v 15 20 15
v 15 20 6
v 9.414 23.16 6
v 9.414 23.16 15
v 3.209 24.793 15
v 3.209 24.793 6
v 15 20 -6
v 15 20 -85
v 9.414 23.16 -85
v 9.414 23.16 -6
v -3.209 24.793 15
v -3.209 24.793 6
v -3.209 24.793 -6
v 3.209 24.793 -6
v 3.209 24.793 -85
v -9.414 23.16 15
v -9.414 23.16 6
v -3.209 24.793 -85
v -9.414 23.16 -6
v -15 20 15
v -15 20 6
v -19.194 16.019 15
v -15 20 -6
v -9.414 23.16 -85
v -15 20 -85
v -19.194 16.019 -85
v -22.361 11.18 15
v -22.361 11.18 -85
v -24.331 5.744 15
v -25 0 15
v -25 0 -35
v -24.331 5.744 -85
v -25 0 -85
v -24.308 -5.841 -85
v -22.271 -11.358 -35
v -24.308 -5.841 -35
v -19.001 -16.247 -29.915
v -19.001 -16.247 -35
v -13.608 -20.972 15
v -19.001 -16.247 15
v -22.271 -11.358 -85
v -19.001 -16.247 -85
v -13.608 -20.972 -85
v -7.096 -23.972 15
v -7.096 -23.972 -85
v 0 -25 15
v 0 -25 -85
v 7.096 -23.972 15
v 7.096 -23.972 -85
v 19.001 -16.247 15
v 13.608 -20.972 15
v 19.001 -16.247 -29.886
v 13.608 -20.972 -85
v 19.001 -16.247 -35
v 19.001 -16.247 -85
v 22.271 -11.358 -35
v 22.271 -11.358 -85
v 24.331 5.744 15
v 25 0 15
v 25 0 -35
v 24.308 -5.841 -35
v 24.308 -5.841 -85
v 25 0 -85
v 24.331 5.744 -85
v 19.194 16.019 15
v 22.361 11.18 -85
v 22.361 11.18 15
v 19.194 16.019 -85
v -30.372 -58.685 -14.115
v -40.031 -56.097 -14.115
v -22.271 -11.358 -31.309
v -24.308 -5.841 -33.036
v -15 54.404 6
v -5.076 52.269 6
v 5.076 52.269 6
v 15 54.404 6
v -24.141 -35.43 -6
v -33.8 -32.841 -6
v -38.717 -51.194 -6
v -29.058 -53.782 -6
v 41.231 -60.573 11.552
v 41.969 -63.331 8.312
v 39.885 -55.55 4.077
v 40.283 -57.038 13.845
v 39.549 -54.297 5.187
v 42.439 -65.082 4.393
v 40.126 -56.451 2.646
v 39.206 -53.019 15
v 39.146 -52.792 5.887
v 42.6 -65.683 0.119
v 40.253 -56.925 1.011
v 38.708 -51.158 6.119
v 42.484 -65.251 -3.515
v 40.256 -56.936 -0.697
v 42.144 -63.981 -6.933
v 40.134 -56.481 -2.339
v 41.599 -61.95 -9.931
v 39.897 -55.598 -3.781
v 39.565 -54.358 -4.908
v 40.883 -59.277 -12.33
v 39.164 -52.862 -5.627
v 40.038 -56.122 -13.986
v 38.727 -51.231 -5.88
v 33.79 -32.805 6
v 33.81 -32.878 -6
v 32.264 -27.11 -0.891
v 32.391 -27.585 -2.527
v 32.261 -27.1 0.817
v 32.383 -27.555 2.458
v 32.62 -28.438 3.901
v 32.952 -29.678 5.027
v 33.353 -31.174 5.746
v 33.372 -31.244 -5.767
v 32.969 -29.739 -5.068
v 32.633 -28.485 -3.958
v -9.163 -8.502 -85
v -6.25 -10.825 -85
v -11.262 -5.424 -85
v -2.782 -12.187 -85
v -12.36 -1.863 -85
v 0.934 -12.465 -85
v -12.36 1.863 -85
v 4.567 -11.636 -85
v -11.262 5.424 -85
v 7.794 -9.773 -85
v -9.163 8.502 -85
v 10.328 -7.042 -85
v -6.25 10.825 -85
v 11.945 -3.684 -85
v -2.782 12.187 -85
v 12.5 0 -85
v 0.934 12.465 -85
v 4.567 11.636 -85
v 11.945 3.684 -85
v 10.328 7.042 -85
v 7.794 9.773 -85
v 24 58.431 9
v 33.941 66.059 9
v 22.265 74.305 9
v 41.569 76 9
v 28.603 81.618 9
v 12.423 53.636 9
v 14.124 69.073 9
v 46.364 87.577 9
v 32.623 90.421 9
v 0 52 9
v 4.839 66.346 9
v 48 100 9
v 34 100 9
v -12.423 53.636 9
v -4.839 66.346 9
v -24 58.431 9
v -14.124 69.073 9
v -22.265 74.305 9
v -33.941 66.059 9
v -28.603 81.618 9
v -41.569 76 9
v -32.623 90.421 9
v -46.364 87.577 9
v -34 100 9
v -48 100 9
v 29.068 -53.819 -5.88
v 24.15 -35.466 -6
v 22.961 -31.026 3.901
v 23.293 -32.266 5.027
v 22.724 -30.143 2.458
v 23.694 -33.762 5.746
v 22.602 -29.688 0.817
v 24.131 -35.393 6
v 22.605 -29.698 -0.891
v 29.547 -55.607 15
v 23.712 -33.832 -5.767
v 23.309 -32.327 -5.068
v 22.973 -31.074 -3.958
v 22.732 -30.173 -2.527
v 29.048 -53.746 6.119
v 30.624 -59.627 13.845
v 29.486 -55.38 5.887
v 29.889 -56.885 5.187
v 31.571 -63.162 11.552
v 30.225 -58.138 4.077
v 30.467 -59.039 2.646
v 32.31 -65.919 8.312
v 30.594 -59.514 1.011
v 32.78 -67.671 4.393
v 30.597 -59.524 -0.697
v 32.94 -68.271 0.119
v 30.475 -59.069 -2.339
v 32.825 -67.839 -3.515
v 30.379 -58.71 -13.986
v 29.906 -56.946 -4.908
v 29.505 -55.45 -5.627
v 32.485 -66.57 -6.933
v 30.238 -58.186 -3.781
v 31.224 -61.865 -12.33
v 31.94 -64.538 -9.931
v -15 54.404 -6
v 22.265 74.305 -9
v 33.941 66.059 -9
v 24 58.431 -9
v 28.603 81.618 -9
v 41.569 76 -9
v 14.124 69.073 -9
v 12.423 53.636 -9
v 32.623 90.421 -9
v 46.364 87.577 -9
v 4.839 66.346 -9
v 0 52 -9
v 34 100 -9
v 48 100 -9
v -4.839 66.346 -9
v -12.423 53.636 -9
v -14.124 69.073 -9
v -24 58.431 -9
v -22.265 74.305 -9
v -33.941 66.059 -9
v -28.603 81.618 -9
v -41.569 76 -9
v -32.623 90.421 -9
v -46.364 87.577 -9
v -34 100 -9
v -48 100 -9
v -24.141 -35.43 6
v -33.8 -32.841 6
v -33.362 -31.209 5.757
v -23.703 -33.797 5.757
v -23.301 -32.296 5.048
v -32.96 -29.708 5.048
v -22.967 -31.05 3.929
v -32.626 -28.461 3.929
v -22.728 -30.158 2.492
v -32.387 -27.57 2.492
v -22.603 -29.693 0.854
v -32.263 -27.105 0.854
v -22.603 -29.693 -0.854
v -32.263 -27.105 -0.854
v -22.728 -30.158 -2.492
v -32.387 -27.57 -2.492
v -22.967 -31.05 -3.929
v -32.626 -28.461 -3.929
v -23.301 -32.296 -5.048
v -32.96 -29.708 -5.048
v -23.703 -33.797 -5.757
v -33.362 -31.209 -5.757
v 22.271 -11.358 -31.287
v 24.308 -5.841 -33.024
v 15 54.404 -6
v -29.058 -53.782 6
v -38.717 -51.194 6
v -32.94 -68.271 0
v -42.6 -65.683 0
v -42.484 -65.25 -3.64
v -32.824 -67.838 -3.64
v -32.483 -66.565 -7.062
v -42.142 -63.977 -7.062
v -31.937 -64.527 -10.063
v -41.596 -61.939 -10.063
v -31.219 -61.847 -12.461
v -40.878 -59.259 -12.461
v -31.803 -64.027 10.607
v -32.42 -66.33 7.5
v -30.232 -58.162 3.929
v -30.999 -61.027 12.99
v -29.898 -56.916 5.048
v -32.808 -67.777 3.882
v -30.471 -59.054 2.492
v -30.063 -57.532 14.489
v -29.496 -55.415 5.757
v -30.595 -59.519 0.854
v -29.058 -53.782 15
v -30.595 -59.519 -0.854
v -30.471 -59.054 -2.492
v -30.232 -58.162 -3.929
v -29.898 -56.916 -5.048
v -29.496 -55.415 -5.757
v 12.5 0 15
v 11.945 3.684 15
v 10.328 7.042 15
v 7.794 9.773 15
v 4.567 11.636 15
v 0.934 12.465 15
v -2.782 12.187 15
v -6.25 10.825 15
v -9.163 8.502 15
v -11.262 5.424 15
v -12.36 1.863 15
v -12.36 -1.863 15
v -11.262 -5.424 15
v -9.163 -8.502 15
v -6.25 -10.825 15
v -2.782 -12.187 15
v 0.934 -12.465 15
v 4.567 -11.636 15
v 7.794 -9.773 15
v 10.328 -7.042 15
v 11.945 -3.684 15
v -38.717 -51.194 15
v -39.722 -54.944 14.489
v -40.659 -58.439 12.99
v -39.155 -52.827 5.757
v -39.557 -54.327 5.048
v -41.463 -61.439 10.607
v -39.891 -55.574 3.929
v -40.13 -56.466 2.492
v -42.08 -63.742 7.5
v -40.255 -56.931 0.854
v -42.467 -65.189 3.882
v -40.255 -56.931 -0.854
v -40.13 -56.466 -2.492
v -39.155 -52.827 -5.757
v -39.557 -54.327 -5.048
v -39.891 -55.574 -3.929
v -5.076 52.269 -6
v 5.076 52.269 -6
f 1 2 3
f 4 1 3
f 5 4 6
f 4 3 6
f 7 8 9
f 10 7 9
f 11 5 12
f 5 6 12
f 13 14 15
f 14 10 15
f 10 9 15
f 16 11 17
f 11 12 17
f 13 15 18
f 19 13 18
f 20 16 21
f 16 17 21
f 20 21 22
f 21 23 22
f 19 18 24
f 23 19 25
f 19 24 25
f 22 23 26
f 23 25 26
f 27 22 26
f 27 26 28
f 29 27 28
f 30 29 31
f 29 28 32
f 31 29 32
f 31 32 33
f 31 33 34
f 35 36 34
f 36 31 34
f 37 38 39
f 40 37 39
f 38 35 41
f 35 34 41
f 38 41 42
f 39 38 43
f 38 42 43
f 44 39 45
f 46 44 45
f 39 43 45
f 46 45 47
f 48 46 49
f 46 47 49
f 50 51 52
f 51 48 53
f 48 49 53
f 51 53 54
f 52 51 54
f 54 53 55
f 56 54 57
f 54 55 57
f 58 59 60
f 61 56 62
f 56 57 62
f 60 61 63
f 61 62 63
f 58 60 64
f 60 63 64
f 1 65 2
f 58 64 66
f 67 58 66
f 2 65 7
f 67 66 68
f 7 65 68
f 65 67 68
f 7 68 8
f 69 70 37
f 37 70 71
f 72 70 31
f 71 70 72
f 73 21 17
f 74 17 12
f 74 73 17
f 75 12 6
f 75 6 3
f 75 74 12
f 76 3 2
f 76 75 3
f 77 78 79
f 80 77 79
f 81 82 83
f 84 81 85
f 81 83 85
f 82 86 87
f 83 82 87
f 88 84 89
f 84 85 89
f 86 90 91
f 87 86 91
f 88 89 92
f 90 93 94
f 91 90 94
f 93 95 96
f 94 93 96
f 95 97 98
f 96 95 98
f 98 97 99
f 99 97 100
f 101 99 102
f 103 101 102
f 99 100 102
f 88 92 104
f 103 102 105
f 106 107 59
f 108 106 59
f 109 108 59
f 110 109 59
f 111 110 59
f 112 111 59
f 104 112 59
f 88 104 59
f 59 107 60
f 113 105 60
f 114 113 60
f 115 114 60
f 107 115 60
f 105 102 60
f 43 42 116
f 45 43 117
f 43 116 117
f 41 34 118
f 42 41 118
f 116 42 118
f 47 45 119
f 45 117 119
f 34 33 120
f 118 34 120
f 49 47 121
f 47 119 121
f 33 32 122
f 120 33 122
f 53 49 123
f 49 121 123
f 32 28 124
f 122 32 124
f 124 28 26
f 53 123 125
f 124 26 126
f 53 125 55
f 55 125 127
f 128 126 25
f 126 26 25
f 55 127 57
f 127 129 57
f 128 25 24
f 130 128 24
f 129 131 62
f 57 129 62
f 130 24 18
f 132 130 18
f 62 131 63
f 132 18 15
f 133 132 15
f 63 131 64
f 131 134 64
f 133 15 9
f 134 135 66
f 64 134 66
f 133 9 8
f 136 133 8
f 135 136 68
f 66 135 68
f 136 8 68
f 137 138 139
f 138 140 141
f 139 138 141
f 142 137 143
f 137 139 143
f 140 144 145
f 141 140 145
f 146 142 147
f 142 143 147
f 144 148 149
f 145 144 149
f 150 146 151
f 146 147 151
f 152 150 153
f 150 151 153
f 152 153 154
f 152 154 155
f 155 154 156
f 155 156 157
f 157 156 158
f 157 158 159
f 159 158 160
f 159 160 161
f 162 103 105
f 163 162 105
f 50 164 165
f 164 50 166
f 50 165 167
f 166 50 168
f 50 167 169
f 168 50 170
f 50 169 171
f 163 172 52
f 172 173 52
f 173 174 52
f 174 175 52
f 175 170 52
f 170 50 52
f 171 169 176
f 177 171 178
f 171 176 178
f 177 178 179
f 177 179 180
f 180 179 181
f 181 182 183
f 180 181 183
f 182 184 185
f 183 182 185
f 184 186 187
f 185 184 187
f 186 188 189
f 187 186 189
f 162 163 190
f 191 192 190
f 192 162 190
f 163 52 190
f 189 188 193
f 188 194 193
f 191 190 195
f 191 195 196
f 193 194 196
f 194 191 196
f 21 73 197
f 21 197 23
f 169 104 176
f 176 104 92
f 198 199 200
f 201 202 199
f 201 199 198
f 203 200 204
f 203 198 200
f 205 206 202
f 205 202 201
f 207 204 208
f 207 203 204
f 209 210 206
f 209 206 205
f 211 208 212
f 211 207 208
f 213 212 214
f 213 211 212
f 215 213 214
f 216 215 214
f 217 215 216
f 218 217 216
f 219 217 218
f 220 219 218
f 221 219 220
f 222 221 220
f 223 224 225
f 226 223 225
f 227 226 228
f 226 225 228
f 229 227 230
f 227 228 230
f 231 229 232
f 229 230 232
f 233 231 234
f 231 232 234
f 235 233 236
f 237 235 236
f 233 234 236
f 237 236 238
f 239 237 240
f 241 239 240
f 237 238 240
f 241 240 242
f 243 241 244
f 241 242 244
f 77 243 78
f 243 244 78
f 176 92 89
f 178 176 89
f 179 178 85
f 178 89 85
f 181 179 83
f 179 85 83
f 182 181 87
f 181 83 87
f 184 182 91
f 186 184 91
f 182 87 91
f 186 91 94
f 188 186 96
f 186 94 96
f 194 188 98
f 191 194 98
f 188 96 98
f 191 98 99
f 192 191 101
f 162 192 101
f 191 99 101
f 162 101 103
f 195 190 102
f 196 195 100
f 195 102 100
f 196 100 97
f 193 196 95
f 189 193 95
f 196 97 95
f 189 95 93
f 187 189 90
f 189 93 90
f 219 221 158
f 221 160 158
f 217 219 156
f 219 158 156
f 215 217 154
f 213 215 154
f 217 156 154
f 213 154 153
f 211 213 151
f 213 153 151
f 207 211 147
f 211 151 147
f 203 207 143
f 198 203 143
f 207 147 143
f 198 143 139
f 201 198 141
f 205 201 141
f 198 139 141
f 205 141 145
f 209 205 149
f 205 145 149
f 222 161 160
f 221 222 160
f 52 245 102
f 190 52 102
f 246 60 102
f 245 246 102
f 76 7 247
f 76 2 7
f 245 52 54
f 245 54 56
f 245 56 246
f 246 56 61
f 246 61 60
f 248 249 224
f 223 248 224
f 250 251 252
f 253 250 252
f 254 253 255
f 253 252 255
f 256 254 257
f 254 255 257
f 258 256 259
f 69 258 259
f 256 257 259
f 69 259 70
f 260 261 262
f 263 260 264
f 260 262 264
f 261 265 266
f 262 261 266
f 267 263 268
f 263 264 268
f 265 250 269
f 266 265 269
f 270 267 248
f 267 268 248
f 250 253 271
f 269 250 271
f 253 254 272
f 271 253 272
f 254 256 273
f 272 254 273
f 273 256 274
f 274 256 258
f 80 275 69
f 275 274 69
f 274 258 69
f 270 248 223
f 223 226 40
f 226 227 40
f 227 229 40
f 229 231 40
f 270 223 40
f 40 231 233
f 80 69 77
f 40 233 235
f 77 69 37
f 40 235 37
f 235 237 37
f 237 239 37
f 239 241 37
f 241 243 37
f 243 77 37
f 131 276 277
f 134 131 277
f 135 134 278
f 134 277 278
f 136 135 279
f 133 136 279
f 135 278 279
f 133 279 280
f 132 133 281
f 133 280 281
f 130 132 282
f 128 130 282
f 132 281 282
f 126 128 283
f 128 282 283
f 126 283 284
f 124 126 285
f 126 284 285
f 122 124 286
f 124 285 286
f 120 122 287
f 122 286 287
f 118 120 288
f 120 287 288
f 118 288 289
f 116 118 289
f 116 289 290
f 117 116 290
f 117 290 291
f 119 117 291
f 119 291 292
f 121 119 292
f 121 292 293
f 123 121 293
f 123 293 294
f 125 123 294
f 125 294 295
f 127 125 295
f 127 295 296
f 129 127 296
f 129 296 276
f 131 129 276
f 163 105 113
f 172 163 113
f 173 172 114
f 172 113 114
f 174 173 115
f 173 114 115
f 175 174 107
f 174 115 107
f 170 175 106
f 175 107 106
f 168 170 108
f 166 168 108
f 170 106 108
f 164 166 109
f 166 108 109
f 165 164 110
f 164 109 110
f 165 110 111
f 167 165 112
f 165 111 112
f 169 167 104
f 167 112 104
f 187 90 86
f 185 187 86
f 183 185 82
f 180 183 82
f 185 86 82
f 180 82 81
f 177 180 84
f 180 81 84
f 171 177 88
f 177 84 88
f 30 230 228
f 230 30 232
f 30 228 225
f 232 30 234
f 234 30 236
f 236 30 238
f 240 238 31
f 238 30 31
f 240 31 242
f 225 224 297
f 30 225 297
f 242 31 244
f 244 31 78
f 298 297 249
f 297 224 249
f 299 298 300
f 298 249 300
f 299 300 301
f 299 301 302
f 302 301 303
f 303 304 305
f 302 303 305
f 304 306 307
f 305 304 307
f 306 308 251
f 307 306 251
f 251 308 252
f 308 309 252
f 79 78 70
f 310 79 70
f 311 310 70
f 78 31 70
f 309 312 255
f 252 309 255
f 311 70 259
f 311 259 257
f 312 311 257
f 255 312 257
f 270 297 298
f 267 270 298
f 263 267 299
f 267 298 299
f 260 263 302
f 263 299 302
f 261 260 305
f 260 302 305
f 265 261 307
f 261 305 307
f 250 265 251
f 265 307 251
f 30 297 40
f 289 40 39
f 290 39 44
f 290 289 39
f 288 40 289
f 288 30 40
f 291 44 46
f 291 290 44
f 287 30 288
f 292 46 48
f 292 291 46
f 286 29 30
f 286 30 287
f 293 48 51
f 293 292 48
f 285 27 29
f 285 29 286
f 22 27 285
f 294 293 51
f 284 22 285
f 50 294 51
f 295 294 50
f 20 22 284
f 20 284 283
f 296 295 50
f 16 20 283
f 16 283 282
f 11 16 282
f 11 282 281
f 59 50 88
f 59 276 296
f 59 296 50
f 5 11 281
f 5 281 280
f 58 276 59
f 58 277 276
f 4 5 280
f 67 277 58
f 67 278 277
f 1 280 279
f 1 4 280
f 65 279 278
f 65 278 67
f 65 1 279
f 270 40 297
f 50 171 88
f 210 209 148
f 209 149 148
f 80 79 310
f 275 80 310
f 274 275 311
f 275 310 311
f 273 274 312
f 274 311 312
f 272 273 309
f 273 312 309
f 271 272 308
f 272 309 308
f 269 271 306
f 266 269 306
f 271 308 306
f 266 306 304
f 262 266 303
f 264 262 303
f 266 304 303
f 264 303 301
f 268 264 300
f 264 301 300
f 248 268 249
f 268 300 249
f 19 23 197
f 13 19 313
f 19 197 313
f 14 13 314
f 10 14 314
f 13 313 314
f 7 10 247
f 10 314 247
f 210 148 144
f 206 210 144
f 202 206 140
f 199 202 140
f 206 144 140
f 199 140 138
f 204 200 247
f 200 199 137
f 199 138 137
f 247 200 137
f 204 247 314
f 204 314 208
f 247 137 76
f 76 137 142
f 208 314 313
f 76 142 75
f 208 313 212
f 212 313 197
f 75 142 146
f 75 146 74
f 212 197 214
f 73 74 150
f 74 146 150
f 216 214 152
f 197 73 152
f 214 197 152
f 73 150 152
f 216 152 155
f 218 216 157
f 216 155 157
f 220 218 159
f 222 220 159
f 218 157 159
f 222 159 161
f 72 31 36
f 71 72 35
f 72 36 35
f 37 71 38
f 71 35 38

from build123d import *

# Parameters (mm, degrees)
BOSS_EXTRUDE1_DEPTH        = 9
BOSS_EXTRUDE2_DEPTH        = 6
BOSS_EXTRUDE3_DEPTH        = 15
BOSS_EXTRUDE3_DEPTH_BACK   = 85
BOSS_EXTRUDE4_DEPTH        = 15
BOSS_EXTRUDE4_DEPTH_BACK   = 35
CUT_EXTRUDE1_DEPTH         = 10
CUT_EXTRUDE2_DEPTH         = 10
BOSS_EXTRUDE6_DEPTH        = 15
BOSS_EXTRUDE6_DEPTH_BACK   = 85
SKETCH1_6_R                = 25
F_25_0_25_DIAMETER_HOLE1_D = 25


with BuildPart() as part:
    # Sketch1 → Boss-Extrude1 (new, symmetric)
    with BuildSketch(Plane.XY):
        with BuildLine():
            Line((-48, 100), (-34, 100))
            ThreePointArc((-34, 100), (0, 66), (34, 100))
            Line((34, 100), (48, 100))
            ThreePointArc((48, 100), (0, 52), (-48, 100))
        make_face()
    extrude(amount=BOSS_EXTRUDE1_DEPTH, both=True)

    # Sketch1<3> → Boss-Extrude2 (add, symmetric)
    with BuildSketch(Plane.XY):
        with BuildLine():
            ThreePointArc((15, 54.403947539), (0, 52), (-15, 54.403947539))
            Line((-15, 54.403947539), (-15, 20))
            ThreePointArc((-15, 20), (0, 25), (15, 20))
            Line((15, 20), (15, 54.403947539))
        make_face()
    extrude(amount=BOSS_EXTRUDE2_DEPTH, both=True)

    # Sketch1<4> → Boss-Extrude3 (add, two sides: drawn at the far end of the back side and taken through both)
    with BuildSketch(Plane.XY.offset(-BOSS_EXTRUDE3_DEPTH_BACK)):
        with BuildLine():
            Line((-15.340741737, -2.588190451), (-25, 0))
            ThreePointArc((-25, 0), (-23.452260867, -8.659760979), (-19.000683183, -16.247277882))
            Line((-19.000683183, -16.247277882), (-15.340741737, -2.588190451))
        make_face()
        with BuildLine():
            ThreePointArc((19.000683183, -16.247277882), (23.452260867, -8.659760979), (25, 0))
            Line((25, 0), (15.340741737, -2.588190451))
            Line((15.340741737, -2.588190451), (19.000683183, -16.247277882))
        make_face()
        with BuildLine():
            ThreePointArc((15, 20), (0, 25), (-15, 20))
            ThreePointArc((-15, 20), (-22.360679775, 11.180339887), (-25, 0))
            Line((-25, 0), (-15.340741737, -2.588190451))
            Line((-15.340741737, -2.588190451), (-19.000683183, -16.247277882))
            ThreePointArc((-19.000683183, -16.247277882), (0, -25), (19.000683183, -16.247277882))
            Line((19.000683183, -16.247277882), (15.340741737, -2.588190451))
            Line((15.340741737, -2.588190451), (25, 0))
            ThreePointArc((25, 0), (22.360679775, 11.180339887), (15, 20))
        make_face()
    extrude(amount=BOSS_EXTRUDE3_DEPTH + BOSS_EXTRUDE3_DEPTH_BACK)

    # Sketch1<5> → Boss-Extrude4 (add, two sides: drawn at the far end of the back side and taken through both)
    with BuildSketch(Plane.XY.offset(-BOSS_EXTRUDE4_DEPTH_BACK)):
        with BuildLine():
            ThreePointArc((-19.000683183, -16.247277882), (-23.452260867, -8.659760979), (-25, 0))
            Line((-25, 0), (-42.599695067, -65.682956188))
            Line((-42.599695067, -65.682956188), (-32.940436804, -68.271146639))
            Line((-32.940436804, -68.271146639), (-19.000683183, -16.247277882))
        make_face()
        with BuildLine():
            Line((42.599695067, -65.682956188), (25, 0))
            ThreePointArc((25, 0), (23.452260867, -8.659760979), (19.000683183, -16.247277882))
            Line((19.000683183, -16.247277882), (32.940436804, -68.271146639))
            Line((32.940436804, -68.271146639), (42.599695067, -65.682956188))
        make_face()
    extrude(amount=BOSS_EXTRUDE4_DEPTH + BOSS_EXTRUDE4_DEPTH_BACK)

    # Sketch3 → Cut-Extrude1 (cut)
    with BuildSketch(Plane(origin=(-23.325317547, 6.25, 0), x_dir=(0, 0, 1), z_dir=(-0.9659258262890681, 0.2588190451025213, 0))):
        with BuildLine():
            Line((-14.115045046, -64.546449271), (-35, -6.470476128))
            Line((-35, -6.470476128), (-35, -74.470476128))
            Line((-35, -74.470476128), (1.18e-07, -74.470476128))
            ThreePointArc((1.18e-07, -74.470476128), (-8.627293932, -71.741164756), (-14.115045046, -64.546449271))
        make_face()
        with BuildLine():
            Line((15, -74.470476128), (15, -59.470476128))
            ThreePointArc((15, -59.470476128), (10.60660176, -70.077077804), (1.18e-07, -74.470476128))
            Line((1.18e-07, -74.470476128), (15, -74.470476128))
        make_face()
        with BuildLine():
            Line((-6, -40.470476128), (-6, -59.470476128))
            ThreePointArc((-6, -59.470476128), (0, -65.470476128), (6, -59.470476128))
            Line((6, -59.470476128), (6, -40.470476128))
            ThreePointArc((6, -40.470476128), (0, -34.470476128), (-6, -40.470476128))
        make_face()
    extrude(amount=-CUT_EXTRUDE1_DEPTH, mode=Mode.SUBTRACT)

    # Sketch4 → Cut-Extrude2 (cut)
    with BuildSketch(Plane(origin=(23.325317547, 6.25, 0), x_dir=(0, 0, -1), z_dir=(0.9659258262890681, 0.2588190451025213, 0))):
        with BuildLine():
            Line((35, -74.470476128), (35, -6.470476128))
            Line((35, -6.470476128), (13.986332308, -64.572126035))
            ThreePointArc((13.986332308, -64.572126035), (8.496673309, -71.749009188), (-0.119452585, -74.470476128))
            Line((-0.119452585, -74.470476128), (35, -74.470476128))
        make_face()
        with BuildLine():
            ThreePointArc((-0.119452585, -74.470476128), (-10.03562817, -70.725229004), (-15, -61.359737742))
            Line((-15, -61.359737742), (-15, -74.470476128))
            Line((-15, -74.470476128), (-0.119452585, -74.470476128))
        make_face()
        with BuildLine():
            Line((-5.999881425, -40.432754995), (-6.119334038, -59.432754995))
            ThreePointArc((-6.119334038, -59.432754995), (-0.157173745, -65.470357553), (5.880428813, -59.50819726))
            Line((5.880428813, -59.50819726), (5.999881425, -40.50819726))
            ThreePointArc((5.999881425, -40.50819726), (0.037721132, -34.470594702), (-5.999881425, -40.432754995))
        make_face()
    extrude(amount=-CUT_EXTRUDE2_DEPTH, mode=Mode.SUBTRACT)

    # Sketch1<6> → Boss-Extrude6 (add, two sides: drawn at the far end of the back side and taken through both)
    with BuildSketch(Plane.XY.offset(-BOSS_EXTRUDE6_DEPTH_BACK)):
        Circle(SKETCH1_6_R)
    extrude(amount=BOSS_EXTRUDE6_DEPTH + BOSS_EXTRUDE6_DEPTH_BACK)

    # Ø25.0 (25) Diameter Hole1 (through all)
    with Locations(Plane(origin=(0, 0, -85), x_dir=(-1, 0, 0), z_dir=(0, 0, -1))):
        with Locations((0, 0)):
            Hole(F_25_0_25_DIAMETER_HOLE1_D / 2)


solid = part.part
